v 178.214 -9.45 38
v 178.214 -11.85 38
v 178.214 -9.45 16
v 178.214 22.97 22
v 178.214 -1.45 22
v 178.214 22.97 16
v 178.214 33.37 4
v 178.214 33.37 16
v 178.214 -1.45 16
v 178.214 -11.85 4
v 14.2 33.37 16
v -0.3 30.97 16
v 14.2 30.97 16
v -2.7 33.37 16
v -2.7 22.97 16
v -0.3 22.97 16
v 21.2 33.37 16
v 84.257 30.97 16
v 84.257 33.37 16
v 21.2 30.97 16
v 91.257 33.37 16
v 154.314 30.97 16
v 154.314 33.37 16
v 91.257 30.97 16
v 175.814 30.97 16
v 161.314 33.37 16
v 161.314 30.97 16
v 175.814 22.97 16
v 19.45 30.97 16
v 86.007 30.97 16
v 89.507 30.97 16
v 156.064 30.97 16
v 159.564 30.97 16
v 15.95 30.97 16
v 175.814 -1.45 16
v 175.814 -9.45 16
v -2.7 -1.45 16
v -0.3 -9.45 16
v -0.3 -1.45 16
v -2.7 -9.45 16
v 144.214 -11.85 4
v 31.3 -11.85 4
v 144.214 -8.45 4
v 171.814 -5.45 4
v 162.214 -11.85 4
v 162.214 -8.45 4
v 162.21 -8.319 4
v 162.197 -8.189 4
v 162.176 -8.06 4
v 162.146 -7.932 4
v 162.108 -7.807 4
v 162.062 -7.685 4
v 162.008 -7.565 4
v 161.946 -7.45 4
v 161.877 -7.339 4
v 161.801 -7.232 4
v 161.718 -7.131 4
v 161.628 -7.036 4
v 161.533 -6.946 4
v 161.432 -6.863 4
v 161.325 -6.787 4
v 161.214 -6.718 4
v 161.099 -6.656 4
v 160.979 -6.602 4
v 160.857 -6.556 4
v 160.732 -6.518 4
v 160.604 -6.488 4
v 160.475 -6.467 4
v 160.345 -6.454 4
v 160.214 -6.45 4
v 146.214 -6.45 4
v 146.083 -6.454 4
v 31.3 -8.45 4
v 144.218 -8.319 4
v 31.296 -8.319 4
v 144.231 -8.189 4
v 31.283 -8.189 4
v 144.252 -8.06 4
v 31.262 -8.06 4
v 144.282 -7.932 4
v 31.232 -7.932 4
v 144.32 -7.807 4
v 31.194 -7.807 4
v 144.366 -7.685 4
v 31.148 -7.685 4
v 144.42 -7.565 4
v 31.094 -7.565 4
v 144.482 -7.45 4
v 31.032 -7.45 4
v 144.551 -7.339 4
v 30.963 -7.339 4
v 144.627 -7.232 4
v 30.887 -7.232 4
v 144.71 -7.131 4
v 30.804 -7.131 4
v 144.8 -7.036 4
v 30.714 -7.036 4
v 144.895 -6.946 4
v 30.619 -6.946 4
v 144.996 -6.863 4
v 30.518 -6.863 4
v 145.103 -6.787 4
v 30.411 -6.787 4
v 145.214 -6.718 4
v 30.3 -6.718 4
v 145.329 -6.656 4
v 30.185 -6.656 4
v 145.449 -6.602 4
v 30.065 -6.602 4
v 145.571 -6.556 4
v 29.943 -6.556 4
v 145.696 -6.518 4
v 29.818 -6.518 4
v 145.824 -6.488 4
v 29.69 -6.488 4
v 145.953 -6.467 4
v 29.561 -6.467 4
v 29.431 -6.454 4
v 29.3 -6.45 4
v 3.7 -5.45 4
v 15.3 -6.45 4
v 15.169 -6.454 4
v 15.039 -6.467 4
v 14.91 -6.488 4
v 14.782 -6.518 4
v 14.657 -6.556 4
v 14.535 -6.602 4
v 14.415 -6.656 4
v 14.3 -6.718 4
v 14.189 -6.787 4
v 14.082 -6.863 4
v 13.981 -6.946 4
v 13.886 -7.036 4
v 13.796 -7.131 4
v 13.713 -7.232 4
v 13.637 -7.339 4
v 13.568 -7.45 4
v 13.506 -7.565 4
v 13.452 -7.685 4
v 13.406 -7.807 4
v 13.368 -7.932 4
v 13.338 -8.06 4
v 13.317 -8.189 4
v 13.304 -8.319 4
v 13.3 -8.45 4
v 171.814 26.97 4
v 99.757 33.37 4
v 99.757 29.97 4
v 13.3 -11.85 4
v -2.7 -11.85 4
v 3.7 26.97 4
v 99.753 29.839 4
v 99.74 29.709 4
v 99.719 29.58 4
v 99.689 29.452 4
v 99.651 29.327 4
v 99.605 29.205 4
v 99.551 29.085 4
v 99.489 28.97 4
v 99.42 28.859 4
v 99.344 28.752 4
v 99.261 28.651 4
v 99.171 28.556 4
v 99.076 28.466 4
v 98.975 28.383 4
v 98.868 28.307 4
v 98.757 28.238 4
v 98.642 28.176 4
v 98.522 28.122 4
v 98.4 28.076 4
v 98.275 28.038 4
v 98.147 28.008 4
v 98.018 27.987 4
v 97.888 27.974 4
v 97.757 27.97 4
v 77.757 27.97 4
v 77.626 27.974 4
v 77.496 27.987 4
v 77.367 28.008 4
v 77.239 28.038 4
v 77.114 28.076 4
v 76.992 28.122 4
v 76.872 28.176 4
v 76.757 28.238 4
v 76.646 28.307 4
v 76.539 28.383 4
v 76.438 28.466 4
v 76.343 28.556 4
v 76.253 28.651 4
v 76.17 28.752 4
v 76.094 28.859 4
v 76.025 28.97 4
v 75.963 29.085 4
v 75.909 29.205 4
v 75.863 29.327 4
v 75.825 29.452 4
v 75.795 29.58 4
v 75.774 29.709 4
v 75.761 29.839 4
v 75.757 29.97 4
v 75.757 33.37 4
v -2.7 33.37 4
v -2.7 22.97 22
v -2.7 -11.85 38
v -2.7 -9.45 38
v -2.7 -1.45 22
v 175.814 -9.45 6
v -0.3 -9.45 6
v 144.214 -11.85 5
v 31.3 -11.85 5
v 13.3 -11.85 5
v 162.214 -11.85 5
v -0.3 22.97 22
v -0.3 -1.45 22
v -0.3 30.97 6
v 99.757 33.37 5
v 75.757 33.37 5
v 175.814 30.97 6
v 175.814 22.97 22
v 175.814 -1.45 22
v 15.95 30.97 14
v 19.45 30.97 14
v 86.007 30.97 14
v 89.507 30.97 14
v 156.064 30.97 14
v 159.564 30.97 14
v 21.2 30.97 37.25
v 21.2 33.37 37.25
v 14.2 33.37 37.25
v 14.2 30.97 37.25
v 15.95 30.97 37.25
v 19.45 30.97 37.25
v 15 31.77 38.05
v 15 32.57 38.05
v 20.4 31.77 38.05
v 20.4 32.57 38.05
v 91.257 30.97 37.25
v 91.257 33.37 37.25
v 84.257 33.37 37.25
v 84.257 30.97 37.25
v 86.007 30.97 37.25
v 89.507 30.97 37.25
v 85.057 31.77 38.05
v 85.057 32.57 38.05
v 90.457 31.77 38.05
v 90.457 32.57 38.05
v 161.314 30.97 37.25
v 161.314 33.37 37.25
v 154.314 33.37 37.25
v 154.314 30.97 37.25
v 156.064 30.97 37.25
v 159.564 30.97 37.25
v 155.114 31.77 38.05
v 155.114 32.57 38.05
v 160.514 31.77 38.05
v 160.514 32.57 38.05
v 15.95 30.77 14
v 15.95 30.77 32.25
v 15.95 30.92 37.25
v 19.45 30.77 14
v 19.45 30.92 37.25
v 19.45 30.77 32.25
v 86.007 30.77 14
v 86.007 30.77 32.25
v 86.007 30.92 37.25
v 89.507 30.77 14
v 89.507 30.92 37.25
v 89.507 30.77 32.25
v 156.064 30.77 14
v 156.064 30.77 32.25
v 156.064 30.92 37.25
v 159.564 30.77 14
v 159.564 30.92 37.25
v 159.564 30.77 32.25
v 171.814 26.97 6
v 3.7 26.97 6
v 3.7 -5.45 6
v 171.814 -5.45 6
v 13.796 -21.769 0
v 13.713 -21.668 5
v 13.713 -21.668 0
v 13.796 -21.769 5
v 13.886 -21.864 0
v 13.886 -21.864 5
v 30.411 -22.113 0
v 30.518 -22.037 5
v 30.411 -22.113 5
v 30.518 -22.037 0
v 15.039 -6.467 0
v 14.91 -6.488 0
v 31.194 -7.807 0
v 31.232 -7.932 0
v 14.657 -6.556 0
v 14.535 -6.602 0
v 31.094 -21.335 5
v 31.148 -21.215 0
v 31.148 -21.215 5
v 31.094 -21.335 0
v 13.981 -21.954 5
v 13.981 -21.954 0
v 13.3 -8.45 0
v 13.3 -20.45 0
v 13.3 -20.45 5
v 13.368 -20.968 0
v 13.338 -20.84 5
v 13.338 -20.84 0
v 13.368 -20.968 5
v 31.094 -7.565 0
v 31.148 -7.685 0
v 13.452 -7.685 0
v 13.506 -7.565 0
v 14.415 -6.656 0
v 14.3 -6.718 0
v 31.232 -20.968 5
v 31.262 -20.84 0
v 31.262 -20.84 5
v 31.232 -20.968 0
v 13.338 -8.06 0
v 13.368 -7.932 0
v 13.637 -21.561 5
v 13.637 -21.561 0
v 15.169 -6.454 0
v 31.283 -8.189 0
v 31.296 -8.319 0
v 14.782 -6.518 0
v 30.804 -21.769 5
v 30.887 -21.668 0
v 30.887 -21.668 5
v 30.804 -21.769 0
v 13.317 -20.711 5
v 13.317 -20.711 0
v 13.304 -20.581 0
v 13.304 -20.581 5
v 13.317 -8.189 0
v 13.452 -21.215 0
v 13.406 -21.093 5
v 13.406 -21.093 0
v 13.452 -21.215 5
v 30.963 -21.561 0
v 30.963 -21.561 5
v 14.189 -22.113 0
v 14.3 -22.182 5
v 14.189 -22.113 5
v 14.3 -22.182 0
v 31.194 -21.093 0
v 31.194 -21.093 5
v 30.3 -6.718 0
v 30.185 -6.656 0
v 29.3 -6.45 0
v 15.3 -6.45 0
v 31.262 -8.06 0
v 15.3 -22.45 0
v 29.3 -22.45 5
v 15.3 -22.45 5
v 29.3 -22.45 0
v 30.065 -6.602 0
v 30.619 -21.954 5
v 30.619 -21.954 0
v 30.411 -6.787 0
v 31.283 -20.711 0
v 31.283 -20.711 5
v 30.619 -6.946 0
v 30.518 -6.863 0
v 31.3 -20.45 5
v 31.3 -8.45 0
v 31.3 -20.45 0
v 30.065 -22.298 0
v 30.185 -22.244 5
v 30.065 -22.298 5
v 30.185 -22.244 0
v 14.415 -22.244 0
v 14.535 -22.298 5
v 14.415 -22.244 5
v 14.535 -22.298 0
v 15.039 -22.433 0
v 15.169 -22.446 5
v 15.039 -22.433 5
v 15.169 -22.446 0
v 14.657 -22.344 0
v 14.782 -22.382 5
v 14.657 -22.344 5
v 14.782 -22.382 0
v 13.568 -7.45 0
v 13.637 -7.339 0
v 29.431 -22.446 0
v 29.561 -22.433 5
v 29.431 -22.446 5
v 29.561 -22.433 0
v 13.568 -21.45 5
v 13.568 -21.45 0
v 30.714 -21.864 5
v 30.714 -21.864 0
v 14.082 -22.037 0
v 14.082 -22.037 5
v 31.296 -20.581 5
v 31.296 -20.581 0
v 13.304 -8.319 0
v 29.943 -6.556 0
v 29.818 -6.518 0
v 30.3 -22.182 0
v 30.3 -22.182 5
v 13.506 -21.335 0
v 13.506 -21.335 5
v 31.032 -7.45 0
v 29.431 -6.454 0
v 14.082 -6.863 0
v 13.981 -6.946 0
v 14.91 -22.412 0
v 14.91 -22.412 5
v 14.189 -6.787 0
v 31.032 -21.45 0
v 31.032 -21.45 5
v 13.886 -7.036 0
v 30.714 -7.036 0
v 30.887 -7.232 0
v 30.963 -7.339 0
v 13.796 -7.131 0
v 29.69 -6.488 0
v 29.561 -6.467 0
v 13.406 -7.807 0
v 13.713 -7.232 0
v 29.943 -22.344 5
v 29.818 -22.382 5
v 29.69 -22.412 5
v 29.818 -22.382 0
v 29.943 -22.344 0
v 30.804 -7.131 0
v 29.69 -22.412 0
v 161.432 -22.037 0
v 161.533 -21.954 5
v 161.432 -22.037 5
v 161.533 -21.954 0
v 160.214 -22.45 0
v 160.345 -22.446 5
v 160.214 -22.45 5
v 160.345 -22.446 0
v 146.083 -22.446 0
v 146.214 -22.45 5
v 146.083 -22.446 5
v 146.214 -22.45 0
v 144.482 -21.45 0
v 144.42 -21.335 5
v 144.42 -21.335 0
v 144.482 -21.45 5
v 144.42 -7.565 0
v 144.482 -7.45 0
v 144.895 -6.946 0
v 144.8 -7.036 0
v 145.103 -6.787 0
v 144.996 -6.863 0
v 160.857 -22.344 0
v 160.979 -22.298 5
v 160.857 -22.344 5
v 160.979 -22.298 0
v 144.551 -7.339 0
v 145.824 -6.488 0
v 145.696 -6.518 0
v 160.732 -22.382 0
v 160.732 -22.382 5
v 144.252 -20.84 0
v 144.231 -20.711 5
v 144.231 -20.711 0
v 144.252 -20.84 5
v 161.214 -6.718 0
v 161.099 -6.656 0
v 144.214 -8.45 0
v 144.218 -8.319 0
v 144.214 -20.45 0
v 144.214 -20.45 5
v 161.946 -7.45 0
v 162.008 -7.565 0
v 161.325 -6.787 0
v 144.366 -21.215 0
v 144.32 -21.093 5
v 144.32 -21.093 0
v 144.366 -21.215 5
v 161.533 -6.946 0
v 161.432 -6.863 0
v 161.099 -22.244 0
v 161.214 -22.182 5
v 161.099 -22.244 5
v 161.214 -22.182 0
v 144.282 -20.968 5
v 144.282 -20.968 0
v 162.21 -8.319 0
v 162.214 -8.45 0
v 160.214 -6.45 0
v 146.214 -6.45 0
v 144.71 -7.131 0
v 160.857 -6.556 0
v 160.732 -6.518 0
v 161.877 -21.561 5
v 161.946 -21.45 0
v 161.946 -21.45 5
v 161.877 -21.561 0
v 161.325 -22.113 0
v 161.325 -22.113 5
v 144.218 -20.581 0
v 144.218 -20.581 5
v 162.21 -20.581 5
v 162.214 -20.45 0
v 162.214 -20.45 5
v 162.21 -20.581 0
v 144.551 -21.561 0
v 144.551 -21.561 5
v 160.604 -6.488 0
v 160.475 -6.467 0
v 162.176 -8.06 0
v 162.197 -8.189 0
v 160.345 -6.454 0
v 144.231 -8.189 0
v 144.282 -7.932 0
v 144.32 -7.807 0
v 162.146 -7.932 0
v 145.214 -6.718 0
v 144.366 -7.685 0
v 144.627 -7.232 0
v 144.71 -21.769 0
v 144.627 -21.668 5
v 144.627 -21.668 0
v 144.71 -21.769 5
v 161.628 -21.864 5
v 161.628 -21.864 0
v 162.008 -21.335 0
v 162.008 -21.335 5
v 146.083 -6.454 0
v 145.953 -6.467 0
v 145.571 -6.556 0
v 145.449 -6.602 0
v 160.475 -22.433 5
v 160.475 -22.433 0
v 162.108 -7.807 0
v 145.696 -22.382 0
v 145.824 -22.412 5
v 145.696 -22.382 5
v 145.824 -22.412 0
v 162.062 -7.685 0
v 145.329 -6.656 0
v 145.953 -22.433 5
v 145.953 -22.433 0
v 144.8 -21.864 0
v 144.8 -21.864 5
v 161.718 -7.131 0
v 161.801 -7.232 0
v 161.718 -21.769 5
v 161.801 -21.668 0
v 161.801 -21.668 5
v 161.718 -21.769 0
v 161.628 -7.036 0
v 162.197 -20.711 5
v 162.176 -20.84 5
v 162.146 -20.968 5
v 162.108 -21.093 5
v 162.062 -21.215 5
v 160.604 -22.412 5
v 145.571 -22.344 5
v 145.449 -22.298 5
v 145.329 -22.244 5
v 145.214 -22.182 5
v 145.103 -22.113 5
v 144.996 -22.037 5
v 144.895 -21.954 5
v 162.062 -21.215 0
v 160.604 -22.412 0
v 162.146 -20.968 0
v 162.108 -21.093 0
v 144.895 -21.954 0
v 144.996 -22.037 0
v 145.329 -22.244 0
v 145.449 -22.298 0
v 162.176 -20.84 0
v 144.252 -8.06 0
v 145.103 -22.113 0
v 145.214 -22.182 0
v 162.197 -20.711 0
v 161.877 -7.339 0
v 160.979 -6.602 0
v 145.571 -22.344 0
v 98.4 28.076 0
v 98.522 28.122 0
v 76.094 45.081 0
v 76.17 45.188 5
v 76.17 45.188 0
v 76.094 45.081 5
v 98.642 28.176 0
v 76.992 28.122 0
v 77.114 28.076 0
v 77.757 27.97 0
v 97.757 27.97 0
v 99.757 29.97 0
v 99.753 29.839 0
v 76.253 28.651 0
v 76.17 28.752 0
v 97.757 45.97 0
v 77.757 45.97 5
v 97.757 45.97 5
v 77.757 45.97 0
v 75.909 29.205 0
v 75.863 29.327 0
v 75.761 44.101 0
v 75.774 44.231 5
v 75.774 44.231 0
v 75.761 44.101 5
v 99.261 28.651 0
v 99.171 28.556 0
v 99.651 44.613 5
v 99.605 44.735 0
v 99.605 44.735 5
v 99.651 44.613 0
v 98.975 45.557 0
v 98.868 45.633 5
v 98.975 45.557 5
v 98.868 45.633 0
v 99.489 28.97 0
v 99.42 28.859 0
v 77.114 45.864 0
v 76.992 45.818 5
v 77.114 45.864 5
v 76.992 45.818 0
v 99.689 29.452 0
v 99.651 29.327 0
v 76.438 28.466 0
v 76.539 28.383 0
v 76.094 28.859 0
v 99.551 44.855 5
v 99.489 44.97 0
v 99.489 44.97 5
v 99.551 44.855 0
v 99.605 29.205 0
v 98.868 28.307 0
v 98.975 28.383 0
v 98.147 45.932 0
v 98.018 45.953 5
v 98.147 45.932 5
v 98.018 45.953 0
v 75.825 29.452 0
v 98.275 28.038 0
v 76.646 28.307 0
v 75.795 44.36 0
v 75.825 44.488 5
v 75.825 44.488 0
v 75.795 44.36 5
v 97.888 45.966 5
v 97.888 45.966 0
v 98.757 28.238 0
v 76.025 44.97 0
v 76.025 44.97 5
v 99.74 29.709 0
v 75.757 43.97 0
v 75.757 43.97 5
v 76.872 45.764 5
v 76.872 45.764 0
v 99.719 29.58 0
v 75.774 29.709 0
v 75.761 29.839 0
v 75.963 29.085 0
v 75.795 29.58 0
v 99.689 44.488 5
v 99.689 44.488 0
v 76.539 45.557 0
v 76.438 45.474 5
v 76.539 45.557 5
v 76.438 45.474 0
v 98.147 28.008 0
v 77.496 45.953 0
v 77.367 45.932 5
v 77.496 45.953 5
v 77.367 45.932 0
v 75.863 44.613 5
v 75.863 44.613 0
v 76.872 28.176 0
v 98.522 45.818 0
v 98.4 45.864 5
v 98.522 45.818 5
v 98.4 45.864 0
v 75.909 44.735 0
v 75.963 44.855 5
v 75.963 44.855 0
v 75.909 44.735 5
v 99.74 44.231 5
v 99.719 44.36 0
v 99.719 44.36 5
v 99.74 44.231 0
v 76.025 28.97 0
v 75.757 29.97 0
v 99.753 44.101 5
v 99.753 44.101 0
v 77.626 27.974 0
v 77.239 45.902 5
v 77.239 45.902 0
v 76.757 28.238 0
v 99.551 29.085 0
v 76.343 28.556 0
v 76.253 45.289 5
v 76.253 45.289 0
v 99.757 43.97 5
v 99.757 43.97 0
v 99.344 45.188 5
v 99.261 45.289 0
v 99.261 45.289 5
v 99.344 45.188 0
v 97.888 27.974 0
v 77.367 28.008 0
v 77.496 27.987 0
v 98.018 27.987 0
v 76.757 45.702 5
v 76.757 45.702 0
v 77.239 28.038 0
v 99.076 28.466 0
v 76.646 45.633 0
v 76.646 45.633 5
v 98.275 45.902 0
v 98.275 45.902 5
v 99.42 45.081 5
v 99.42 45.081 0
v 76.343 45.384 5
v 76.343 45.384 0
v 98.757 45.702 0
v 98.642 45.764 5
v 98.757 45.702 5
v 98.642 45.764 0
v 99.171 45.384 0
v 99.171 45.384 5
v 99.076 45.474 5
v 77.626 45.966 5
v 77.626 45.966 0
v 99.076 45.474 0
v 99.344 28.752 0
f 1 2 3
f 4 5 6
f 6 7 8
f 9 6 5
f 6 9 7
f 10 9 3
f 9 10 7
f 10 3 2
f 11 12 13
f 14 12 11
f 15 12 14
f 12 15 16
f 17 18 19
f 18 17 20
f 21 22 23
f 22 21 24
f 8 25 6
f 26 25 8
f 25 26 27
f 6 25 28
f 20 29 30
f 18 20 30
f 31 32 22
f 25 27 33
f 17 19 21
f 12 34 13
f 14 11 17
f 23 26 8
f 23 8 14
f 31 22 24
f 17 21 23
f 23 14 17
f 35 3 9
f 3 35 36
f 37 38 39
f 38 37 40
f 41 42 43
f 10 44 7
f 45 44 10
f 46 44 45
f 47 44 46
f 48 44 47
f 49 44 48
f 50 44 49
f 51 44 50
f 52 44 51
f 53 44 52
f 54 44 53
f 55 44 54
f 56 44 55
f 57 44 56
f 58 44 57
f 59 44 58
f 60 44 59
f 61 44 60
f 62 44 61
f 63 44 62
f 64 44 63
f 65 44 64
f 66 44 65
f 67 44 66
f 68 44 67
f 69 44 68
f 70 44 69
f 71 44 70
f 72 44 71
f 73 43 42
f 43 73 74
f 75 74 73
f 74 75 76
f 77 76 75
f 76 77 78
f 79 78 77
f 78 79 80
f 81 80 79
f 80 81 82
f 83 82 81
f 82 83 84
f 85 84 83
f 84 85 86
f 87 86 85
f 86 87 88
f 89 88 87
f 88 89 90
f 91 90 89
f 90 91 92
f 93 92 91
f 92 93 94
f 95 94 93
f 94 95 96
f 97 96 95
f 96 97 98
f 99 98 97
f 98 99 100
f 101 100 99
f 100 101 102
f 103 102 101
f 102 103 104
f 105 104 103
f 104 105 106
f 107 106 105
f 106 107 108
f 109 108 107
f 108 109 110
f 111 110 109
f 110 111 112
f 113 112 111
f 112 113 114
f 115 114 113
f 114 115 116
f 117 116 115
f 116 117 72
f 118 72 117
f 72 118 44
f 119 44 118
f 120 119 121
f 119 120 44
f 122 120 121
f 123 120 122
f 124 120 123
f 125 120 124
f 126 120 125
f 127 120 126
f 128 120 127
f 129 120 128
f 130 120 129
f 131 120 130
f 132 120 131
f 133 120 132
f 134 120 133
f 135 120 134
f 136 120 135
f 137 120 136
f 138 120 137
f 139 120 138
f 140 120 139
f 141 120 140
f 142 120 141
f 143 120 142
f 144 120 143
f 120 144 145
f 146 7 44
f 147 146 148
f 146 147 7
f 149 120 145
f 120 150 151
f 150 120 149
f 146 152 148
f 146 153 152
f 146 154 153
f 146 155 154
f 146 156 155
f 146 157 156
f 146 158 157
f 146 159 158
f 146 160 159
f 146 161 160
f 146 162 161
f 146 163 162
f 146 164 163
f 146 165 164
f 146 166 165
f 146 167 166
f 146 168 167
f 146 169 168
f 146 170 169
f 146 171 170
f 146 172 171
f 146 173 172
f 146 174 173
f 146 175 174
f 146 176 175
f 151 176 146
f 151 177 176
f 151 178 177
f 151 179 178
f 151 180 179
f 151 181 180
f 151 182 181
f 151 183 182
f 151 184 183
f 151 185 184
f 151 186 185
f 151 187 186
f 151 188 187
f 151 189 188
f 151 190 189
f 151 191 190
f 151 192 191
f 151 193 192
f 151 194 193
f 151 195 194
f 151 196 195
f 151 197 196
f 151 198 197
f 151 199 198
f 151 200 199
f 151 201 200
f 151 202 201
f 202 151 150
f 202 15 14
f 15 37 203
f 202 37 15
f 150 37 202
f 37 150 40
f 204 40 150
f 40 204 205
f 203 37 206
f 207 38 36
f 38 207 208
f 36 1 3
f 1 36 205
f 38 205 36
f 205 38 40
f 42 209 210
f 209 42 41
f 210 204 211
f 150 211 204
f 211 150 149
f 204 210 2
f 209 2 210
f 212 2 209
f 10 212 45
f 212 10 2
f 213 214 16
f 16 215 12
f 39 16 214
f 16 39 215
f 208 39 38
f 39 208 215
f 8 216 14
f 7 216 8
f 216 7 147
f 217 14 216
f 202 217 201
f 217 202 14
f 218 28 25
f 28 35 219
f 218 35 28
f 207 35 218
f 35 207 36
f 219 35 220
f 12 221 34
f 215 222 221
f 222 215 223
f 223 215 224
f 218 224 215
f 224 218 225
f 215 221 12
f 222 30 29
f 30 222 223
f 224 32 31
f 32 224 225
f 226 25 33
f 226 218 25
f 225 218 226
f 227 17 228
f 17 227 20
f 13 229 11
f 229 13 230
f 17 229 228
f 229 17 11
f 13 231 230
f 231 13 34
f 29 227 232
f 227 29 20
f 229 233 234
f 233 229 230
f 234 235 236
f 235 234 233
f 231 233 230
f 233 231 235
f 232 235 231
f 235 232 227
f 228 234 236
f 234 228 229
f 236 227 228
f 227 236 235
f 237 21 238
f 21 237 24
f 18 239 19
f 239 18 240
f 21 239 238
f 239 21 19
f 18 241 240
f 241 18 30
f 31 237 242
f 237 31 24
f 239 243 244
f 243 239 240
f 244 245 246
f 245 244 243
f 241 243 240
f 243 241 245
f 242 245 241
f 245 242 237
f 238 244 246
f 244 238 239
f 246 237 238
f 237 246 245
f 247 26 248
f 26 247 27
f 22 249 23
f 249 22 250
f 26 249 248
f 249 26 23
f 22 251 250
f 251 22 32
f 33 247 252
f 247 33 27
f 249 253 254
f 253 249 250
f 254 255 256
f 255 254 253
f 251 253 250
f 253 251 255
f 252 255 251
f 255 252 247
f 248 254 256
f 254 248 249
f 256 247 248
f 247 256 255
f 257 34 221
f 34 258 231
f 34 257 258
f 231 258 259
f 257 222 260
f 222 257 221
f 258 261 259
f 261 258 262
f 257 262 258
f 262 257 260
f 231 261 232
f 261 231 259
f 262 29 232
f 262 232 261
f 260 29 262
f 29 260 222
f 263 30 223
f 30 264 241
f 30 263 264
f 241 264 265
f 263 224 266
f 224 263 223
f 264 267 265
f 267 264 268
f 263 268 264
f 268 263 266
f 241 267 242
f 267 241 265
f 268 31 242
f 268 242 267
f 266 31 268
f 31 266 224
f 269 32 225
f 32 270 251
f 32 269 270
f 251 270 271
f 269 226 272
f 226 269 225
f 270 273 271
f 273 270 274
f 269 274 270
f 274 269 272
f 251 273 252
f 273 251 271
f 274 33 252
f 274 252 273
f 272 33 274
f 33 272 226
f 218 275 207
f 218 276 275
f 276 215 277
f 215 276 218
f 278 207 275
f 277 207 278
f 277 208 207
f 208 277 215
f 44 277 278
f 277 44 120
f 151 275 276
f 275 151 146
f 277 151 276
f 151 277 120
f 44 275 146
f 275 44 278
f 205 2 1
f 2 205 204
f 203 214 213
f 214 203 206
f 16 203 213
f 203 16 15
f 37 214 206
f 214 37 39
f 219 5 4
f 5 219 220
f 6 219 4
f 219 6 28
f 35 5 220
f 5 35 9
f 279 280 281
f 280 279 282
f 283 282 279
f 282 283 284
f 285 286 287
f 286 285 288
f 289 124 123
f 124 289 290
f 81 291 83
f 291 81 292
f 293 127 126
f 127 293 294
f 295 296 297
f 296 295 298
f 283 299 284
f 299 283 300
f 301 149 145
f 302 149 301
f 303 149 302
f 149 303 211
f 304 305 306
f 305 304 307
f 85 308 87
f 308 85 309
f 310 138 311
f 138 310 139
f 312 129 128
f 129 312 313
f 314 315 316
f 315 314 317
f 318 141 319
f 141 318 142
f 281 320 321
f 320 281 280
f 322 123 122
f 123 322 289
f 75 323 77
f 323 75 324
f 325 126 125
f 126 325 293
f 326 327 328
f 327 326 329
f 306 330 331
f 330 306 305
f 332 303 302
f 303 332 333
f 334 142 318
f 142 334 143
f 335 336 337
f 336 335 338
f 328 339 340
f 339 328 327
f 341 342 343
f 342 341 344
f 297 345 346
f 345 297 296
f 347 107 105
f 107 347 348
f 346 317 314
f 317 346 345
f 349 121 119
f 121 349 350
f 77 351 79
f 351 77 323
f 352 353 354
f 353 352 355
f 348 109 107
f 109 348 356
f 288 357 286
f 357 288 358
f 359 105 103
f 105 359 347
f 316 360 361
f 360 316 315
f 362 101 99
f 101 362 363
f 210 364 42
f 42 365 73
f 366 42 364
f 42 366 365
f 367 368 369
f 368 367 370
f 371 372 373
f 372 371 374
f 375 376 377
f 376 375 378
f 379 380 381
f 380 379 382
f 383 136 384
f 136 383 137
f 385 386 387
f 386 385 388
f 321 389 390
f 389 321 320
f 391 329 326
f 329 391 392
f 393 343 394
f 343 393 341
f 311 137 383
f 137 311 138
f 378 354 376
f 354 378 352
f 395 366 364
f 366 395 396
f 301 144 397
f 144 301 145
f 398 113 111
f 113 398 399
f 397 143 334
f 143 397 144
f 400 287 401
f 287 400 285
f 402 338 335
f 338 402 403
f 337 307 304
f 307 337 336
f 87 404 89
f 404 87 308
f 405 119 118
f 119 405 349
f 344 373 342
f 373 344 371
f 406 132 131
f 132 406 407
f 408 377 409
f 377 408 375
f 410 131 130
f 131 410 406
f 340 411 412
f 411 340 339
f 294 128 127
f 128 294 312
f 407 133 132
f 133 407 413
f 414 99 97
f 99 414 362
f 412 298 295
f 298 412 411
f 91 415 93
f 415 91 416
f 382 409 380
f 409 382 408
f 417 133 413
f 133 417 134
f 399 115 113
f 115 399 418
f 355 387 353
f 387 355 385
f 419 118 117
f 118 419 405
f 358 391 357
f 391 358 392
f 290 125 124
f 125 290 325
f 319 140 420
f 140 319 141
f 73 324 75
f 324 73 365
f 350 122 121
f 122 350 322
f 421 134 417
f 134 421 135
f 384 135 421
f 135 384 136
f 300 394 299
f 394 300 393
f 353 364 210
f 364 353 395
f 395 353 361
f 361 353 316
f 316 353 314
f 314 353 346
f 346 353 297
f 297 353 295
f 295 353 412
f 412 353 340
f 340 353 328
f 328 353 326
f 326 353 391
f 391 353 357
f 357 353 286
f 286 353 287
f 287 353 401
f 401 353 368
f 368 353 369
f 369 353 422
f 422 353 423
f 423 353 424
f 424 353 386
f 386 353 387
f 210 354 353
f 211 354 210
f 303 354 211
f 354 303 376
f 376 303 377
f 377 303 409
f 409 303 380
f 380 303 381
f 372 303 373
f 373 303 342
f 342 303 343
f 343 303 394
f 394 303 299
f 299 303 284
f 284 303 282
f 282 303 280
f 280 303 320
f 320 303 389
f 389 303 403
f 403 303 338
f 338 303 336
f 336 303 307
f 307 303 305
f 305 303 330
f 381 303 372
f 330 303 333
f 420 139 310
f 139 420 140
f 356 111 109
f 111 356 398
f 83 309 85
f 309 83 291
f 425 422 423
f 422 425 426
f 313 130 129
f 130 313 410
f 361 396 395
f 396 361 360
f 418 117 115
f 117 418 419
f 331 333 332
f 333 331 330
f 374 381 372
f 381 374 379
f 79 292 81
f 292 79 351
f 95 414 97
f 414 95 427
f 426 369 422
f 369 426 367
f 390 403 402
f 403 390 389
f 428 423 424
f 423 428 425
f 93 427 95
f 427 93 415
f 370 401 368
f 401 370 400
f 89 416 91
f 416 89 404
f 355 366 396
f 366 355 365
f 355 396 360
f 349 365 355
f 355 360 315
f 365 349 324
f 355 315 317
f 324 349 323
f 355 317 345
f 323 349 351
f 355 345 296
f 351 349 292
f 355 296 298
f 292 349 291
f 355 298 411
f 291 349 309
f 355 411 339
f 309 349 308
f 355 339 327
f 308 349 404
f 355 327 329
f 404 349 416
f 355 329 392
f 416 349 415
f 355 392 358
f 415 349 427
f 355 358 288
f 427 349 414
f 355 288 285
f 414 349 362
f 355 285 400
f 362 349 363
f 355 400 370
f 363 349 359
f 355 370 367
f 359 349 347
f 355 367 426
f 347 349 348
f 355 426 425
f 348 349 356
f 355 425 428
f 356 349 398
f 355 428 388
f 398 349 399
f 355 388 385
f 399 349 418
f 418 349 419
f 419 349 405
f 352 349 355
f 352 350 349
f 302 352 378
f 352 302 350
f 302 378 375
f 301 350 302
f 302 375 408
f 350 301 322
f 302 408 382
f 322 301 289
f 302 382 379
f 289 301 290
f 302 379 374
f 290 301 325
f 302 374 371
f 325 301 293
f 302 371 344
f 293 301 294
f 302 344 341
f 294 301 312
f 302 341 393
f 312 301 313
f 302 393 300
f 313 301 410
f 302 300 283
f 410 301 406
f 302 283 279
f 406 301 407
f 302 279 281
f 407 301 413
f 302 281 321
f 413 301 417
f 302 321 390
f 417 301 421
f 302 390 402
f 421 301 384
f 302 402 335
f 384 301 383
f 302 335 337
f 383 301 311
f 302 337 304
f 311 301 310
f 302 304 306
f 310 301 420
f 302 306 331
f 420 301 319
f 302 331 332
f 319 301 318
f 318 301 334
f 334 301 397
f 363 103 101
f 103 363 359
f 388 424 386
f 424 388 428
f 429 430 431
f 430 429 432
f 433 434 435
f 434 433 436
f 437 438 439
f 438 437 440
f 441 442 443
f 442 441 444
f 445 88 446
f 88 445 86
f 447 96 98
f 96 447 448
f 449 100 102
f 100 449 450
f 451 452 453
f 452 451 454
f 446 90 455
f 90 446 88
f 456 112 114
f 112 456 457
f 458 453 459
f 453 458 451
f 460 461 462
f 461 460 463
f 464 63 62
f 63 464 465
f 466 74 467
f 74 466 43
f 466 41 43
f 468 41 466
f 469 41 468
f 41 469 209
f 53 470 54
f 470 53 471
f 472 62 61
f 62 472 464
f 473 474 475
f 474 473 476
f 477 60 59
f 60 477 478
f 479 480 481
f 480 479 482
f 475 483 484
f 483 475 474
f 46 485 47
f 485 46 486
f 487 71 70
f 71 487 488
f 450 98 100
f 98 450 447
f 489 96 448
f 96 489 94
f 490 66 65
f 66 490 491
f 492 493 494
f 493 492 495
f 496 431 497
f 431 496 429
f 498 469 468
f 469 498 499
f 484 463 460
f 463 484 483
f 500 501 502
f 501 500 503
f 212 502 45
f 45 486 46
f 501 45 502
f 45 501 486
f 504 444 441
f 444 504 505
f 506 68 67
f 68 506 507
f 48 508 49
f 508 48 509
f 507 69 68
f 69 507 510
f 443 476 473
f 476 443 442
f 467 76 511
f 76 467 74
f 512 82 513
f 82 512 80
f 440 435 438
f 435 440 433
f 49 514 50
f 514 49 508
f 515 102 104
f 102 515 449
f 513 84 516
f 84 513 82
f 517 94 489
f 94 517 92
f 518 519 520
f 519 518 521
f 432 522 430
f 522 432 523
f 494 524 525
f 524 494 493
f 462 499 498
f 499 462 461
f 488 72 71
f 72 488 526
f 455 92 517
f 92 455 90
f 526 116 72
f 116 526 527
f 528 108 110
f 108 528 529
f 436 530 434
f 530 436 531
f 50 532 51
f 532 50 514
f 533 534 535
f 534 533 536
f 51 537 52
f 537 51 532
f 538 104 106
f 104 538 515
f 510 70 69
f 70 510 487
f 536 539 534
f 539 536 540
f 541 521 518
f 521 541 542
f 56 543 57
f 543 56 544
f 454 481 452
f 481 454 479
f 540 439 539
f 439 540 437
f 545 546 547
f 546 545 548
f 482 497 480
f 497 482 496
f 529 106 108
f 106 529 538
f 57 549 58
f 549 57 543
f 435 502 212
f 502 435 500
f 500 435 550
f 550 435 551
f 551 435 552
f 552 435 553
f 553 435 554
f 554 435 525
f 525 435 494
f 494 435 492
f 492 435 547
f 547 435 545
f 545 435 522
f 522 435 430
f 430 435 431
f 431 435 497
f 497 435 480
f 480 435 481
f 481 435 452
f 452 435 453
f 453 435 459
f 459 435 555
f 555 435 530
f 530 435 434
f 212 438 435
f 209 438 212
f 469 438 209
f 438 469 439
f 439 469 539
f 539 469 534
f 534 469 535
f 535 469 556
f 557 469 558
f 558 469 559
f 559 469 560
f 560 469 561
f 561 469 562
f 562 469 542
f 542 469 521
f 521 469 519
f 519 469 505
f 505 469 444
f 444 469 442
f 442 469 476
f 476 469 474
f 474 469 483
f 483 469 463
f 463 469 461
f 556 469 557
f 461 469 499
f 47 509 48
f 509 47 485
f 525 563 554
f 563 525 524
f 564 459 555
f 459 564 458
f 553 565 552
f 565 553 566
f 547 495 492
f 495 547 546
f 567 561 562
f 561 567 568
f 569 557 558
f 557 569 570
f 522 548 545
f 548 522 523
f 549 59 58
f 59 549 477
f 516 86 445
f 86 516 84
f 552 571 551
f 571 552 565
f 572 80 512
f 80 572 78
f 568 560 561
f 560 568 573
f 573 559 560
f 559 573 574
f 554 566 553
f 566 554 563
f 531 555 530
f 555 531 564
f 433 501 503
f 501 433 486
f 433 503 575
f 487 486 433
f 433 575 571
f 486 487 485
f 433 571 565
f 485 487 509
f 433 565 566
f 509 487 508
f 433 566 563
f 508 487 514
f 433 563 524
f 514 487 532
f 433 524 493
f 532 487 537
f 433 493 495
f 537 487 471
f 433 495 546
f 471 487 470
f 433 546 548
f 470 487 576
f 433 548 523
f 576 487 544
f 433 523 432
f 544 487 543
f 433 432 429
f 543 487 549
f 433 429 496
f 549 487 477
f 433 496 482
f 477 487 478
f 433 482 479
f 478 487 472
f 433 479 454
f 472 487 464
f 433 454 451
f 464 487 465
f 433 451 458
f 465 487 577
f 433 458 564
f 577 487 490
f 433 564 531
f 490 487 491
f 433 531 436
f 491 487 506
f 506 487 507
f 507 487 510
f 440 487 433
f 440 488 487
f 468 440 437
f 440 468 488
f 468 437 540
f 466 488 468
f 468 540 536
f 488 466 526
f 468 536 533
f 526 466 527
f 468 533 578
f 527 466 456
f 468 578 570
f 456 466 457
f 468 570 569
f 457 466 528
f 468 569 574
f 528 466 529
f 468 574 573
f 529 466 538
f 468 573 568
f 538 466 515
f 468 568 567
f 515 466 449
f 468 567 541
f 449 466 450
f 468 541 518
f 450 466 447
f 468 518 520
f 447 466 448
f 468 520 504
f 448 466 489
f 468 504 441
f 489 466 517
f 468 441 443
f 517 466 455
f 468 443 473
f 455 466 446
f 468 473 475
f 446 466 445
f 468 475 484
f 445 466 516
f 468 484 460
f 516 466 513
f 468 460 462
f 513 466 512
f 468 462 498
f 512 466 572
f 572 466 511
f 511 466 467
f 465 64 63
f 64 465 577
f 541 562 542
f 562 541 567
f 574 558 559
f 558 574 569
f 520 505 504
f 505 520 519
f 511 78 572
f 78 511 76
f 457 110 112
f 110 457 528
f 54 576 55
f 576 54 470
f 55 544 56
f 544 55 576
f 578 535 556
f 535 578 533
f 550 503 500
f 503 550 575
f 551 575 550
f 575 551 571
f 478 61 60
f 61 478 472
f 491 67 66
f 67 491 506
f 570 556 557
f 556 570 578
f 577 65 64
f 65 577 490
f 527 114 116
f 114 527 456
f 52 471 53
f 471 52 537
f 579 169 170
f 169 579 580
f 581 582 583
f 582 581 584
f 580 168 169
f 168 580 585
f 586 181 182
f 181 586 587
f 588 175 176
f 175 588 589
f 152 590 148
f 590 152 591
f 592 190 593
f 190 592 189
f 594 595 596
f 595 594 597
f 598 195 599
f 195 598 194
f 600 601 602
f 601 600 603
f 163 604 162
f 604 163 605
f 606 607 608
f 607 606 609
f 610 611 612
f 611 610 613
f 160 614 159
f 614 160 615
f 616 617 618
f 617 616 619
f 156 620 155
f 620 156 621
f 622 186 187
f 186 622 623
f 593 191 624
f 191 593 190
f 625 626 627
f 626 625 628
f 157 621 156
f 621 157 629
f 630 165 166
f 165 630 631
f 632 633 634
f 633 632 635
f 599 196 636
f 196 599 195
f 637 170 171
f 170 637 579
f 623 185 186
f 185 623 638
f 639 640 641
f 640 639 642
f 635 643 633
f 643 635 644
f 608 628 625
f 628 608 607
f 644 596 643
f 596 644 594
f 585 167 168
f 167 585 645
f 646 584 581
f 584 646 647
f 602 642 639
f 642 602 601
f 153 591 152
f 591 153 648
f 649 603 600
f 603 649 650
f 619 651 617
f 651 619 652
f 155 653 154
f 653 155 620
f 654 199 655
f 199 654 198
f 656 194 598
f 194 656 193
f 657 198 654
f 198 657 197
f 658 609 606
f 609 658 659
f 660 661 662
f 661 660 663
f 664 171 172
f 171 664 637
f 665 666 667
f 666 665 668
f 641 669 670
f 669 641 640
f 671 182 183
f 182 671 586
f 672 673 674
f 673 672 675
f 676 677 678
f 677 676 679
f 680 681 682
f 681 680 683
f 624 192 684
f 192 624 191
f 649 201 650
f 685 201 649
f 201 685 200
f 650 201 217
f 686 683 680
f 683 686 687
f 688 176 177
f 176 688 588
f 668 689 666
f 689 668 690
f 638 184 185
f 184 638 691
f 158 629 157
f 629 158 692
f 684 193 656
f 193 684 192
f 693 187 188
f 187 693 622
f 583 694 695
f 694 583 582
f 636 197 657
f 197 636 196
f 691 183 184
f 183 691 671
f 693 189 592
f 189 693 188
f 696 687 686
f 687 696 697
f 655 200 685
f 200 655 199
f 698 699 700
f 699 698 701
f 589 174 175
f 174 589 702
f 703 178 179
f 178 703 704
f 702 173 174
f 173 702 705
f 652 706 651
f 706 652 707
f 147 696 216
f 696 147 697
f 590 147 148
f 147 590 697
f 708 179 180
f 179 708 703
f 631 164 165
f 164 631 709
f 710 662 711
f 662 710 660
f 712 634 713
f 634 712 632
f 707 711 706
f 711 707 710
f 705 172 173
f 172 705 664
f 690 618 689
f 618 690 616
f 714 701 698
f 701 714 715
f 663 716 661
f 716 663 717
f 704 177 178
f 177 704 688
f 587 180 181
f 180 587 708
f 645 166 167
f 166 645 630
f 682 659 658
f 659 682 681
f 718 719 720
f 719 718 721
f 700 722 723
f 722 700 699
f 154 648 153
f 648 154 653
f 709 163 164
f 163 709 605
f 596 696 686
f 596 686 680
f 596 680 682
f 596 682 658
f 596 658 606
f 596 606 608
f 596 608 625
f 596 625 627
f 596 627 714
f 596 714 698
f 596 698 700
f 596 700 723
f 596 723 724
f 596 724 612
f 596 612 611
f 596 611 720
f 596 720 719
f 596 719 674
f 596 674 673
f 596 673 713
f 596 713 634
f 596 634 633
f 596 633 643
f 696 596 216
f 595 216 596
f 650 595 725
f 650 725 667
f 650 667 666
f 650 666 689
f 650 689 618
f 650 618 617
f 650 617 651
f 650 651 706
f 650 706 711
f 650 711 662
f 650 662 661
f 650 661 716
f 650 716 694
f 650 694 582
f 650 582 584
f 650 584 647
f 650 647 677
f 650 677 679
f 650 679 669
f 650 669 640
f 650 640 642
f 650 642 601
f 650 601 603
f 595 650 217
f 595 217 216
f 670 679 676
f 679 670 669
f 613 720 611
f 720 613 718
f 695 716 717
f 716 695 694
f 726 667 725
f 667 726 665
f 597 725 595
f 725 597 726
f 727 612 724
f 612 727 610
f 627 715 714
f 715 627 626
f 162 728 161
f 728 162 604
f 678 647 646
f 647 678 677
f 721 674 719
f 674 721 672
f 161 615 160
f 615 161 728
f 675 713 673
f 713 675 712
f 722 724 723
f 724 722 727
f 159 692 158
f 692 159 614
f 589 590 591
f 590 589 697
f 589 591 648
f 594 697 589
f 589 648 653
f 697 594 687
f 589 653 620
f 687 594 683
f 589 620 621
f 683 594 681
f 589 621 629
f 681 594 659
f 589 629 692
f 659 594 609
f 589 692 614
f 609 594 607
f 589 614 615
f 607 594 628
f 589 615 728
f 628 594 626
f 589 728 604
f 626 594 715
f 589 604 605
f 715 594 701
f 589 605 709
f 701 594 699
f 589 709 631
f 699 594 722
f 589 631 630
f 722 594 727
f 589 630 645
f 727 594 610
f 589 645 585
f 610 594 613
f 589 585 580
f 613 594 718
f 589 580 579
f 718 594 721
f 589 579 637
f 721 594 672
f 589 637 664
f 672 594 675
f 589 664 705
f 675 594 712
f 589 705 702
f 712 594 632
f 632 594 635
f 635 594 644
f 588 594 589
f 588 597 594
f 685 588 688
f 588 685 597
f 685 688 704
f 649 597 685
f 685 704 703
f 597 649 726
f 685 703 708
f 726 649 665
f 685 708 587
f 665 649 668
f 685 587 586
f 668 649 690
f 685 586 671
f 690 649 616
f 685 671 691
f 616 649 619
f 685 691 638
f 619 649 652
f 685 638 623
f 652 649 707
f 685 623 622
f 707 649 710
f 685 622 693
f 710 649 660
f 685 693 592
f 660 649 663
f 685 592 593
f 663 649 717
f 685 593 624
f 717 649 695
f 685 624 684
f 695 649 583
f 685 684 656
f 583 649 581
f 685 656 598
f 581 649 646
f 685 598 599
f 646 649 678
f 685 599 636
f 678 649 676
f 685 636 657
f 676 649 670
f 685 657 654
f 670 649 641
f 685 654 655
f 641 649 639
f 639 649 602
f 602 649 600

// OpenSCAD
// DOUBLE TAKE FRAMES DESIGN RELEASE
// DTF_RELEASE: 2.0.2
// Released: 2026-09-04
// Versioning: Semantic Versioning 2.0.0 (https://semver.org/)
// Status: CANONICAL
// Changes in 2.0.2:
// - Carried forward unchanged for the native 3MF packaging hotfix.
// Changes in 2.0.1:
// - Carried forward unchanged for the prepared-project packaging correction.
// Changes in 2.0.0:
// - Carried forward without geometry changes for the coordinated 2.0.0 release.
// Full release notes: https://doubletakeframes.com/build/#design-release
//
$fn = 96;
eps = 0.05;

// =========================================================
// DETACHABLE FRONT BAND + SIDE WALLS + REAR POSTS + FEETS
// Continuous low rail all around.
// Side walls sit on rail but do not connect to front/back above rail.
// Non-friction resting fit.
//
// Corrected:
// - Feet overlap collar/body in Z by foot_body_z_overlap, not just eps.
// - Each foot is shifted a few mm inward under the basket while keeping
//   the original front/rear foot depth.
// =========================================================

inch = 25.4;

// CASSETTE REFERENCE VALUES
cassette_w = 6.91 * inch;

bottom_t    = 3.0;
wall_t      = 3.0;
wall_offset = 0.0;

front_frame_t    = 1.2;
acrylic_gap      = 1.0;
spacer_thickness = 7.0;

front_buildout_total = front_frame_t + acrylic_gap + spacer_thickness;
front_buildout_y0    = wall_offset - front_buildout_total;

roller_r    = 0.75 * inch;
glide_t     = 2.0;
fang_embed  = 0.6;
rail_back_y = 8.0;
roller_cy   = wall_offset + wall_t;

glide_y  = roller_cy + roller_r - glide_t - fang_embed;
bottom_d = glide_y + glide_t + rail_back_y;

backing_board_extra_y = 1/20 * inch;

cassette_x0 = 0;
cassette_x1 = cassette_w;
cassette_y0 = front_buildout_y0;
cassette_y1 = bottom_d + backing_board_extra_y;

// FIT / GEOMETRY
clear_x = 0.3;
clear_y = 0.25;

collar_t = 2.4;

foot_h = 5.0;
foot_body_z_overlap = 1.0;
collar_z0 = foot_h - foot_body_z_overlap;

collar_h = 34.0;
side_wall_h = 18.0;
inner_x0 = cassette_x0 - clear_x;
inner_x1 = cassette_x1 + clear_x;
inner_y0 = cassette_y0 - clear_y;
inner_y1 = cassette_y1 + clear_y;

outer_x0 = inner_x0 - collar_t;
outer_x1 = inner_x1 + collar_t;
outer_y0 = inner_y0 - collar_t;
outer_y1 = inner_y1 + collar_t;

// RESTING LEDGE
rest_lip_t = 4.0;
rest_lip_h = 2.0;

// LOW RAIL
low_rail_h = 12.0;

// SIDE WALLS
side_wall_gap_front = 8.0;
side_wall_gap_rear  = 8.0;
side_wall_t = collar_t;

// REAR POSTS
rear_post_w = 7.0;
rear_post_t = collar_t;
post_bevel = 0.8;

// Localized friction take-up on the three rear backing-board capture posts.
// These project into the existing Y clearance without moving the posts or
// tightening the stand's overall envelope. The upper ramp eases insertion.
rear_post_friction_pad_d = 0.20;
rear_post_friction_pad_w = 3.5;
rear_post_friction_pad_z0 = collar_z0 + low_rail_h - 2.0;
rear_post_friction_pad_z1 = collar_z0 + collar_h - post_bevel;
rear_post_friction_ramp_h = 5.0;

// FEET
front_foot_proj = 16.0;
rear_foot_proj  = 18.0;

front_foot_w = 18.0;
rear_foot_w  = 24.0;

front_foot_inset_x = 16.0;
foot_round = 2.0;

// How far the inner edge of each foot reaches under the basket.
// Original effectively stopped ~0.6 mm short of the inner edge.
foot_y_overlap = 3.0;

// HELPERS
module rounded_rect_prism(x0, x1, y0, y1, z0, z1, r=2) {
    hull() {
        translate([x0+r, y0+r, z0]) cylinder(r=r, h=z1-z0);
        translate([x1-r, y0+r, z0]) cylinder(r=r, h=z1-z0);
        translate([x0+r, y1-r, z0]) cylinder(r=r, h=z1-z0);
        translate([x1-r, y1-r, z0]) cylinder(r=r, h=z1-z0);
    }
}

module beveled_post(xsz, ysz, h, b) {
    bx = min(b, xsz/2 - eps);
    by = min(b, ysz/2 - eps);

    union() {
        cube([xsz, ysz, h - b]);

        translate([0, 0, h - b])
        hull() {
            cube([xsz, ysz, eps]);

            translate([bx, by, b])
                cube([
                    max(eps, xsz - 2*bx),
                    max(eps, ysz - 2*by),
                    eps
                ]);
        }
    }
}

// FRONT BAND
module front_band() {
    translate([outer_x0, outer_y0, collar_z0])
        cube([
            outer_x1 - outer_x0,
            collar_t,
            collar_h
        ]);
}

// CONTINUOUS LOW RAIL
module front_low_rail() {
    translate([outer_x0, outer_y0, collar_z0])
        cube([outer_x1 - outer_x0, collar_t, low_rail_h]);
}

module left_low_rail() {
    translate([outer_x0, outer_y0, collar_z0])
        cube([collar_t, outer_y1 - outer_y0, low_rail_h]);
}

module right_low_rail() {
    translate([outer_x1 - collar_t, outer_y0, collar_z0])
        cube([collar_t, outer_y1 - outer_y0, low_rail_h]);
}

module rear_low_rail() {
    translate([outer_x0, outer_y1 - collar_t, collar_z0])
        cube([outer_x1 - outer_x0, collar_t, low_rail_h]);
}

module low_rails() {
    // front rail overlaps lower part of front band; harmless and strengthens base
    front_low_rail();
    left_low_rail();
    right_low_rail();
    rear_low_rail();
}

// SIDE WALLS
module left_side_wall() {
    y0 = inner_y0 + side_wall_gap_front;
    y1 = inner_y1 - side_wall_gap_rear;

    translate([outer_x0, y0, collar_z0])
        cube([
            side_wall_t,
            y1 - y0,
            side_wall_h
        ]);
}

module right_side_wall() {
    y0 = inner_y0 + side_wall_gap_front;
    y1 = inner_y1 - side_wall_gap_rear;

    translate([inner_x1, y0, collar_z0])
        cube([
            side_wall_t,
            y1 - y0,
            side_wall_h
        ]);
}

// REAR POSTS
module rear_post(x_center) {
    translate([x_center - rear_post_w/2, inner_y1, collar_z0])
        beveled_post(rear_post_w, rear_post_t, collar_h, post_bevel);
}

module rear_post_friction_pad(x_center) {
    pad_x0 = x_center - rear_post_friction_pad_w/2;
    full_pad_y0 = inner_y1 - rear_post_friction_pad_d;
    ramp_z0 = rear_post_friction_pad_z1 - rear_post_friction_ramp_h;

    hull() {
        translate([pad_x0, full_pad_y0, rear_post_friction_pad_z0])
            cube([rear_post_friction_pad_w, rear_post_friction_pad_d + eps, eps]);
        translate([pad_x0, full_pad_y0, ramp_z0])
            cube([rear_post_friction_pad_w, rear_post_friction_pad_d + eps, eps]);
        translate([pad_x0, inner_y1 - eps, rear_post_friction_pad_z1])
            cube([rear_post_friction_pad_w, 2*eps, eps]);
    }
}

module rear_posts() {
    left_post_x = inner_x0 + 18.0;
    center_post_x = (inner_x0 + inner_x1) / 2;
    right_post_x = inner_x1 - 18.0;

    rear_post(left_post_x);
    rear_post(center_post_x);
    rear_post(right_post_x);

    rear_post_friction_pad(left_post_x);
    rear_post_friction_pad(center_post_x);
    rear_post_friction_pad(right_post_x);
}

// BOTTOM RESTING LEDGE
module bottom_rest_lip() {
    translate([inner_x0, inner_y0, collar_z0])
        cube([inner_x1 - inner_x0, rest_lip_t, rest_lip_h]);

    translate([inner_x0, inner_y1 - rest_lip_t, collar_z0])
        cube([inner_x1 - inner_x0, rest_lip_t, rest_lip_h]);

    translate([inner_x0, inner_y0, collar_z0])
        cube([rest_lip_t, inner_y1 - inner_y0, rest_lip_h]);

    translate([inner_x1 - rest_lip_t, inner_y0, collar_z0])
        cube([rest_lip_t, inner_y1 - inner_y0, rest_lip_h]);
}

// FEET
module front_left_foot() {
    x0 = outer_x0 + front_foot_inset_x;
    x1 = x0 + front_foot_w;

    // Same foot depth as original, shifted inward for a few mm of underlap.
    y1 = inner_y0 + foot_y_overlap;
    y0 = y1 - front_foot_proj;

    rounded_rect_prism(x0, x1, y0, y1, 0, foot_h, foot_round);
}

module front_right_foot() {
    x1 = outer_x1 - front_foot_inset_x;
    x0 = x1 - front_foot_w;

    // Same foot depth as original, shifted inward for a few mm of underlap.
    y1 = inner_y0 + foot_y_overlap;
    y0 = y1 - front_foot_proj;

    rounded_rect_prism(x0, x1, y0, y1, 0, foot_h, foot_round);
}

module rear_center_foot() {
    x0 = (outer_x0 + outer_x1)/2 - rear_foot_w/2;
    x1 = x0 + rear_foot_w;

    // Same foot depth as original, shifted inward for a few mm of underlap.
    y0 = inner_y1 - foot_y_overlap;
    y1 = y0 + rear_foot_proj;

    rounded_rect_prism(x0, x1, y0, y1, 0, foot_h, foot_round);
}

// FINAL
union() {
    front_band();
    low_rails();

    left_side_wall();
    right_side_wall();
    rear_posts();

    bottom_rest_lip();

    front_left_foot();
    front_right_foot();
    rear_center_foot();
}
